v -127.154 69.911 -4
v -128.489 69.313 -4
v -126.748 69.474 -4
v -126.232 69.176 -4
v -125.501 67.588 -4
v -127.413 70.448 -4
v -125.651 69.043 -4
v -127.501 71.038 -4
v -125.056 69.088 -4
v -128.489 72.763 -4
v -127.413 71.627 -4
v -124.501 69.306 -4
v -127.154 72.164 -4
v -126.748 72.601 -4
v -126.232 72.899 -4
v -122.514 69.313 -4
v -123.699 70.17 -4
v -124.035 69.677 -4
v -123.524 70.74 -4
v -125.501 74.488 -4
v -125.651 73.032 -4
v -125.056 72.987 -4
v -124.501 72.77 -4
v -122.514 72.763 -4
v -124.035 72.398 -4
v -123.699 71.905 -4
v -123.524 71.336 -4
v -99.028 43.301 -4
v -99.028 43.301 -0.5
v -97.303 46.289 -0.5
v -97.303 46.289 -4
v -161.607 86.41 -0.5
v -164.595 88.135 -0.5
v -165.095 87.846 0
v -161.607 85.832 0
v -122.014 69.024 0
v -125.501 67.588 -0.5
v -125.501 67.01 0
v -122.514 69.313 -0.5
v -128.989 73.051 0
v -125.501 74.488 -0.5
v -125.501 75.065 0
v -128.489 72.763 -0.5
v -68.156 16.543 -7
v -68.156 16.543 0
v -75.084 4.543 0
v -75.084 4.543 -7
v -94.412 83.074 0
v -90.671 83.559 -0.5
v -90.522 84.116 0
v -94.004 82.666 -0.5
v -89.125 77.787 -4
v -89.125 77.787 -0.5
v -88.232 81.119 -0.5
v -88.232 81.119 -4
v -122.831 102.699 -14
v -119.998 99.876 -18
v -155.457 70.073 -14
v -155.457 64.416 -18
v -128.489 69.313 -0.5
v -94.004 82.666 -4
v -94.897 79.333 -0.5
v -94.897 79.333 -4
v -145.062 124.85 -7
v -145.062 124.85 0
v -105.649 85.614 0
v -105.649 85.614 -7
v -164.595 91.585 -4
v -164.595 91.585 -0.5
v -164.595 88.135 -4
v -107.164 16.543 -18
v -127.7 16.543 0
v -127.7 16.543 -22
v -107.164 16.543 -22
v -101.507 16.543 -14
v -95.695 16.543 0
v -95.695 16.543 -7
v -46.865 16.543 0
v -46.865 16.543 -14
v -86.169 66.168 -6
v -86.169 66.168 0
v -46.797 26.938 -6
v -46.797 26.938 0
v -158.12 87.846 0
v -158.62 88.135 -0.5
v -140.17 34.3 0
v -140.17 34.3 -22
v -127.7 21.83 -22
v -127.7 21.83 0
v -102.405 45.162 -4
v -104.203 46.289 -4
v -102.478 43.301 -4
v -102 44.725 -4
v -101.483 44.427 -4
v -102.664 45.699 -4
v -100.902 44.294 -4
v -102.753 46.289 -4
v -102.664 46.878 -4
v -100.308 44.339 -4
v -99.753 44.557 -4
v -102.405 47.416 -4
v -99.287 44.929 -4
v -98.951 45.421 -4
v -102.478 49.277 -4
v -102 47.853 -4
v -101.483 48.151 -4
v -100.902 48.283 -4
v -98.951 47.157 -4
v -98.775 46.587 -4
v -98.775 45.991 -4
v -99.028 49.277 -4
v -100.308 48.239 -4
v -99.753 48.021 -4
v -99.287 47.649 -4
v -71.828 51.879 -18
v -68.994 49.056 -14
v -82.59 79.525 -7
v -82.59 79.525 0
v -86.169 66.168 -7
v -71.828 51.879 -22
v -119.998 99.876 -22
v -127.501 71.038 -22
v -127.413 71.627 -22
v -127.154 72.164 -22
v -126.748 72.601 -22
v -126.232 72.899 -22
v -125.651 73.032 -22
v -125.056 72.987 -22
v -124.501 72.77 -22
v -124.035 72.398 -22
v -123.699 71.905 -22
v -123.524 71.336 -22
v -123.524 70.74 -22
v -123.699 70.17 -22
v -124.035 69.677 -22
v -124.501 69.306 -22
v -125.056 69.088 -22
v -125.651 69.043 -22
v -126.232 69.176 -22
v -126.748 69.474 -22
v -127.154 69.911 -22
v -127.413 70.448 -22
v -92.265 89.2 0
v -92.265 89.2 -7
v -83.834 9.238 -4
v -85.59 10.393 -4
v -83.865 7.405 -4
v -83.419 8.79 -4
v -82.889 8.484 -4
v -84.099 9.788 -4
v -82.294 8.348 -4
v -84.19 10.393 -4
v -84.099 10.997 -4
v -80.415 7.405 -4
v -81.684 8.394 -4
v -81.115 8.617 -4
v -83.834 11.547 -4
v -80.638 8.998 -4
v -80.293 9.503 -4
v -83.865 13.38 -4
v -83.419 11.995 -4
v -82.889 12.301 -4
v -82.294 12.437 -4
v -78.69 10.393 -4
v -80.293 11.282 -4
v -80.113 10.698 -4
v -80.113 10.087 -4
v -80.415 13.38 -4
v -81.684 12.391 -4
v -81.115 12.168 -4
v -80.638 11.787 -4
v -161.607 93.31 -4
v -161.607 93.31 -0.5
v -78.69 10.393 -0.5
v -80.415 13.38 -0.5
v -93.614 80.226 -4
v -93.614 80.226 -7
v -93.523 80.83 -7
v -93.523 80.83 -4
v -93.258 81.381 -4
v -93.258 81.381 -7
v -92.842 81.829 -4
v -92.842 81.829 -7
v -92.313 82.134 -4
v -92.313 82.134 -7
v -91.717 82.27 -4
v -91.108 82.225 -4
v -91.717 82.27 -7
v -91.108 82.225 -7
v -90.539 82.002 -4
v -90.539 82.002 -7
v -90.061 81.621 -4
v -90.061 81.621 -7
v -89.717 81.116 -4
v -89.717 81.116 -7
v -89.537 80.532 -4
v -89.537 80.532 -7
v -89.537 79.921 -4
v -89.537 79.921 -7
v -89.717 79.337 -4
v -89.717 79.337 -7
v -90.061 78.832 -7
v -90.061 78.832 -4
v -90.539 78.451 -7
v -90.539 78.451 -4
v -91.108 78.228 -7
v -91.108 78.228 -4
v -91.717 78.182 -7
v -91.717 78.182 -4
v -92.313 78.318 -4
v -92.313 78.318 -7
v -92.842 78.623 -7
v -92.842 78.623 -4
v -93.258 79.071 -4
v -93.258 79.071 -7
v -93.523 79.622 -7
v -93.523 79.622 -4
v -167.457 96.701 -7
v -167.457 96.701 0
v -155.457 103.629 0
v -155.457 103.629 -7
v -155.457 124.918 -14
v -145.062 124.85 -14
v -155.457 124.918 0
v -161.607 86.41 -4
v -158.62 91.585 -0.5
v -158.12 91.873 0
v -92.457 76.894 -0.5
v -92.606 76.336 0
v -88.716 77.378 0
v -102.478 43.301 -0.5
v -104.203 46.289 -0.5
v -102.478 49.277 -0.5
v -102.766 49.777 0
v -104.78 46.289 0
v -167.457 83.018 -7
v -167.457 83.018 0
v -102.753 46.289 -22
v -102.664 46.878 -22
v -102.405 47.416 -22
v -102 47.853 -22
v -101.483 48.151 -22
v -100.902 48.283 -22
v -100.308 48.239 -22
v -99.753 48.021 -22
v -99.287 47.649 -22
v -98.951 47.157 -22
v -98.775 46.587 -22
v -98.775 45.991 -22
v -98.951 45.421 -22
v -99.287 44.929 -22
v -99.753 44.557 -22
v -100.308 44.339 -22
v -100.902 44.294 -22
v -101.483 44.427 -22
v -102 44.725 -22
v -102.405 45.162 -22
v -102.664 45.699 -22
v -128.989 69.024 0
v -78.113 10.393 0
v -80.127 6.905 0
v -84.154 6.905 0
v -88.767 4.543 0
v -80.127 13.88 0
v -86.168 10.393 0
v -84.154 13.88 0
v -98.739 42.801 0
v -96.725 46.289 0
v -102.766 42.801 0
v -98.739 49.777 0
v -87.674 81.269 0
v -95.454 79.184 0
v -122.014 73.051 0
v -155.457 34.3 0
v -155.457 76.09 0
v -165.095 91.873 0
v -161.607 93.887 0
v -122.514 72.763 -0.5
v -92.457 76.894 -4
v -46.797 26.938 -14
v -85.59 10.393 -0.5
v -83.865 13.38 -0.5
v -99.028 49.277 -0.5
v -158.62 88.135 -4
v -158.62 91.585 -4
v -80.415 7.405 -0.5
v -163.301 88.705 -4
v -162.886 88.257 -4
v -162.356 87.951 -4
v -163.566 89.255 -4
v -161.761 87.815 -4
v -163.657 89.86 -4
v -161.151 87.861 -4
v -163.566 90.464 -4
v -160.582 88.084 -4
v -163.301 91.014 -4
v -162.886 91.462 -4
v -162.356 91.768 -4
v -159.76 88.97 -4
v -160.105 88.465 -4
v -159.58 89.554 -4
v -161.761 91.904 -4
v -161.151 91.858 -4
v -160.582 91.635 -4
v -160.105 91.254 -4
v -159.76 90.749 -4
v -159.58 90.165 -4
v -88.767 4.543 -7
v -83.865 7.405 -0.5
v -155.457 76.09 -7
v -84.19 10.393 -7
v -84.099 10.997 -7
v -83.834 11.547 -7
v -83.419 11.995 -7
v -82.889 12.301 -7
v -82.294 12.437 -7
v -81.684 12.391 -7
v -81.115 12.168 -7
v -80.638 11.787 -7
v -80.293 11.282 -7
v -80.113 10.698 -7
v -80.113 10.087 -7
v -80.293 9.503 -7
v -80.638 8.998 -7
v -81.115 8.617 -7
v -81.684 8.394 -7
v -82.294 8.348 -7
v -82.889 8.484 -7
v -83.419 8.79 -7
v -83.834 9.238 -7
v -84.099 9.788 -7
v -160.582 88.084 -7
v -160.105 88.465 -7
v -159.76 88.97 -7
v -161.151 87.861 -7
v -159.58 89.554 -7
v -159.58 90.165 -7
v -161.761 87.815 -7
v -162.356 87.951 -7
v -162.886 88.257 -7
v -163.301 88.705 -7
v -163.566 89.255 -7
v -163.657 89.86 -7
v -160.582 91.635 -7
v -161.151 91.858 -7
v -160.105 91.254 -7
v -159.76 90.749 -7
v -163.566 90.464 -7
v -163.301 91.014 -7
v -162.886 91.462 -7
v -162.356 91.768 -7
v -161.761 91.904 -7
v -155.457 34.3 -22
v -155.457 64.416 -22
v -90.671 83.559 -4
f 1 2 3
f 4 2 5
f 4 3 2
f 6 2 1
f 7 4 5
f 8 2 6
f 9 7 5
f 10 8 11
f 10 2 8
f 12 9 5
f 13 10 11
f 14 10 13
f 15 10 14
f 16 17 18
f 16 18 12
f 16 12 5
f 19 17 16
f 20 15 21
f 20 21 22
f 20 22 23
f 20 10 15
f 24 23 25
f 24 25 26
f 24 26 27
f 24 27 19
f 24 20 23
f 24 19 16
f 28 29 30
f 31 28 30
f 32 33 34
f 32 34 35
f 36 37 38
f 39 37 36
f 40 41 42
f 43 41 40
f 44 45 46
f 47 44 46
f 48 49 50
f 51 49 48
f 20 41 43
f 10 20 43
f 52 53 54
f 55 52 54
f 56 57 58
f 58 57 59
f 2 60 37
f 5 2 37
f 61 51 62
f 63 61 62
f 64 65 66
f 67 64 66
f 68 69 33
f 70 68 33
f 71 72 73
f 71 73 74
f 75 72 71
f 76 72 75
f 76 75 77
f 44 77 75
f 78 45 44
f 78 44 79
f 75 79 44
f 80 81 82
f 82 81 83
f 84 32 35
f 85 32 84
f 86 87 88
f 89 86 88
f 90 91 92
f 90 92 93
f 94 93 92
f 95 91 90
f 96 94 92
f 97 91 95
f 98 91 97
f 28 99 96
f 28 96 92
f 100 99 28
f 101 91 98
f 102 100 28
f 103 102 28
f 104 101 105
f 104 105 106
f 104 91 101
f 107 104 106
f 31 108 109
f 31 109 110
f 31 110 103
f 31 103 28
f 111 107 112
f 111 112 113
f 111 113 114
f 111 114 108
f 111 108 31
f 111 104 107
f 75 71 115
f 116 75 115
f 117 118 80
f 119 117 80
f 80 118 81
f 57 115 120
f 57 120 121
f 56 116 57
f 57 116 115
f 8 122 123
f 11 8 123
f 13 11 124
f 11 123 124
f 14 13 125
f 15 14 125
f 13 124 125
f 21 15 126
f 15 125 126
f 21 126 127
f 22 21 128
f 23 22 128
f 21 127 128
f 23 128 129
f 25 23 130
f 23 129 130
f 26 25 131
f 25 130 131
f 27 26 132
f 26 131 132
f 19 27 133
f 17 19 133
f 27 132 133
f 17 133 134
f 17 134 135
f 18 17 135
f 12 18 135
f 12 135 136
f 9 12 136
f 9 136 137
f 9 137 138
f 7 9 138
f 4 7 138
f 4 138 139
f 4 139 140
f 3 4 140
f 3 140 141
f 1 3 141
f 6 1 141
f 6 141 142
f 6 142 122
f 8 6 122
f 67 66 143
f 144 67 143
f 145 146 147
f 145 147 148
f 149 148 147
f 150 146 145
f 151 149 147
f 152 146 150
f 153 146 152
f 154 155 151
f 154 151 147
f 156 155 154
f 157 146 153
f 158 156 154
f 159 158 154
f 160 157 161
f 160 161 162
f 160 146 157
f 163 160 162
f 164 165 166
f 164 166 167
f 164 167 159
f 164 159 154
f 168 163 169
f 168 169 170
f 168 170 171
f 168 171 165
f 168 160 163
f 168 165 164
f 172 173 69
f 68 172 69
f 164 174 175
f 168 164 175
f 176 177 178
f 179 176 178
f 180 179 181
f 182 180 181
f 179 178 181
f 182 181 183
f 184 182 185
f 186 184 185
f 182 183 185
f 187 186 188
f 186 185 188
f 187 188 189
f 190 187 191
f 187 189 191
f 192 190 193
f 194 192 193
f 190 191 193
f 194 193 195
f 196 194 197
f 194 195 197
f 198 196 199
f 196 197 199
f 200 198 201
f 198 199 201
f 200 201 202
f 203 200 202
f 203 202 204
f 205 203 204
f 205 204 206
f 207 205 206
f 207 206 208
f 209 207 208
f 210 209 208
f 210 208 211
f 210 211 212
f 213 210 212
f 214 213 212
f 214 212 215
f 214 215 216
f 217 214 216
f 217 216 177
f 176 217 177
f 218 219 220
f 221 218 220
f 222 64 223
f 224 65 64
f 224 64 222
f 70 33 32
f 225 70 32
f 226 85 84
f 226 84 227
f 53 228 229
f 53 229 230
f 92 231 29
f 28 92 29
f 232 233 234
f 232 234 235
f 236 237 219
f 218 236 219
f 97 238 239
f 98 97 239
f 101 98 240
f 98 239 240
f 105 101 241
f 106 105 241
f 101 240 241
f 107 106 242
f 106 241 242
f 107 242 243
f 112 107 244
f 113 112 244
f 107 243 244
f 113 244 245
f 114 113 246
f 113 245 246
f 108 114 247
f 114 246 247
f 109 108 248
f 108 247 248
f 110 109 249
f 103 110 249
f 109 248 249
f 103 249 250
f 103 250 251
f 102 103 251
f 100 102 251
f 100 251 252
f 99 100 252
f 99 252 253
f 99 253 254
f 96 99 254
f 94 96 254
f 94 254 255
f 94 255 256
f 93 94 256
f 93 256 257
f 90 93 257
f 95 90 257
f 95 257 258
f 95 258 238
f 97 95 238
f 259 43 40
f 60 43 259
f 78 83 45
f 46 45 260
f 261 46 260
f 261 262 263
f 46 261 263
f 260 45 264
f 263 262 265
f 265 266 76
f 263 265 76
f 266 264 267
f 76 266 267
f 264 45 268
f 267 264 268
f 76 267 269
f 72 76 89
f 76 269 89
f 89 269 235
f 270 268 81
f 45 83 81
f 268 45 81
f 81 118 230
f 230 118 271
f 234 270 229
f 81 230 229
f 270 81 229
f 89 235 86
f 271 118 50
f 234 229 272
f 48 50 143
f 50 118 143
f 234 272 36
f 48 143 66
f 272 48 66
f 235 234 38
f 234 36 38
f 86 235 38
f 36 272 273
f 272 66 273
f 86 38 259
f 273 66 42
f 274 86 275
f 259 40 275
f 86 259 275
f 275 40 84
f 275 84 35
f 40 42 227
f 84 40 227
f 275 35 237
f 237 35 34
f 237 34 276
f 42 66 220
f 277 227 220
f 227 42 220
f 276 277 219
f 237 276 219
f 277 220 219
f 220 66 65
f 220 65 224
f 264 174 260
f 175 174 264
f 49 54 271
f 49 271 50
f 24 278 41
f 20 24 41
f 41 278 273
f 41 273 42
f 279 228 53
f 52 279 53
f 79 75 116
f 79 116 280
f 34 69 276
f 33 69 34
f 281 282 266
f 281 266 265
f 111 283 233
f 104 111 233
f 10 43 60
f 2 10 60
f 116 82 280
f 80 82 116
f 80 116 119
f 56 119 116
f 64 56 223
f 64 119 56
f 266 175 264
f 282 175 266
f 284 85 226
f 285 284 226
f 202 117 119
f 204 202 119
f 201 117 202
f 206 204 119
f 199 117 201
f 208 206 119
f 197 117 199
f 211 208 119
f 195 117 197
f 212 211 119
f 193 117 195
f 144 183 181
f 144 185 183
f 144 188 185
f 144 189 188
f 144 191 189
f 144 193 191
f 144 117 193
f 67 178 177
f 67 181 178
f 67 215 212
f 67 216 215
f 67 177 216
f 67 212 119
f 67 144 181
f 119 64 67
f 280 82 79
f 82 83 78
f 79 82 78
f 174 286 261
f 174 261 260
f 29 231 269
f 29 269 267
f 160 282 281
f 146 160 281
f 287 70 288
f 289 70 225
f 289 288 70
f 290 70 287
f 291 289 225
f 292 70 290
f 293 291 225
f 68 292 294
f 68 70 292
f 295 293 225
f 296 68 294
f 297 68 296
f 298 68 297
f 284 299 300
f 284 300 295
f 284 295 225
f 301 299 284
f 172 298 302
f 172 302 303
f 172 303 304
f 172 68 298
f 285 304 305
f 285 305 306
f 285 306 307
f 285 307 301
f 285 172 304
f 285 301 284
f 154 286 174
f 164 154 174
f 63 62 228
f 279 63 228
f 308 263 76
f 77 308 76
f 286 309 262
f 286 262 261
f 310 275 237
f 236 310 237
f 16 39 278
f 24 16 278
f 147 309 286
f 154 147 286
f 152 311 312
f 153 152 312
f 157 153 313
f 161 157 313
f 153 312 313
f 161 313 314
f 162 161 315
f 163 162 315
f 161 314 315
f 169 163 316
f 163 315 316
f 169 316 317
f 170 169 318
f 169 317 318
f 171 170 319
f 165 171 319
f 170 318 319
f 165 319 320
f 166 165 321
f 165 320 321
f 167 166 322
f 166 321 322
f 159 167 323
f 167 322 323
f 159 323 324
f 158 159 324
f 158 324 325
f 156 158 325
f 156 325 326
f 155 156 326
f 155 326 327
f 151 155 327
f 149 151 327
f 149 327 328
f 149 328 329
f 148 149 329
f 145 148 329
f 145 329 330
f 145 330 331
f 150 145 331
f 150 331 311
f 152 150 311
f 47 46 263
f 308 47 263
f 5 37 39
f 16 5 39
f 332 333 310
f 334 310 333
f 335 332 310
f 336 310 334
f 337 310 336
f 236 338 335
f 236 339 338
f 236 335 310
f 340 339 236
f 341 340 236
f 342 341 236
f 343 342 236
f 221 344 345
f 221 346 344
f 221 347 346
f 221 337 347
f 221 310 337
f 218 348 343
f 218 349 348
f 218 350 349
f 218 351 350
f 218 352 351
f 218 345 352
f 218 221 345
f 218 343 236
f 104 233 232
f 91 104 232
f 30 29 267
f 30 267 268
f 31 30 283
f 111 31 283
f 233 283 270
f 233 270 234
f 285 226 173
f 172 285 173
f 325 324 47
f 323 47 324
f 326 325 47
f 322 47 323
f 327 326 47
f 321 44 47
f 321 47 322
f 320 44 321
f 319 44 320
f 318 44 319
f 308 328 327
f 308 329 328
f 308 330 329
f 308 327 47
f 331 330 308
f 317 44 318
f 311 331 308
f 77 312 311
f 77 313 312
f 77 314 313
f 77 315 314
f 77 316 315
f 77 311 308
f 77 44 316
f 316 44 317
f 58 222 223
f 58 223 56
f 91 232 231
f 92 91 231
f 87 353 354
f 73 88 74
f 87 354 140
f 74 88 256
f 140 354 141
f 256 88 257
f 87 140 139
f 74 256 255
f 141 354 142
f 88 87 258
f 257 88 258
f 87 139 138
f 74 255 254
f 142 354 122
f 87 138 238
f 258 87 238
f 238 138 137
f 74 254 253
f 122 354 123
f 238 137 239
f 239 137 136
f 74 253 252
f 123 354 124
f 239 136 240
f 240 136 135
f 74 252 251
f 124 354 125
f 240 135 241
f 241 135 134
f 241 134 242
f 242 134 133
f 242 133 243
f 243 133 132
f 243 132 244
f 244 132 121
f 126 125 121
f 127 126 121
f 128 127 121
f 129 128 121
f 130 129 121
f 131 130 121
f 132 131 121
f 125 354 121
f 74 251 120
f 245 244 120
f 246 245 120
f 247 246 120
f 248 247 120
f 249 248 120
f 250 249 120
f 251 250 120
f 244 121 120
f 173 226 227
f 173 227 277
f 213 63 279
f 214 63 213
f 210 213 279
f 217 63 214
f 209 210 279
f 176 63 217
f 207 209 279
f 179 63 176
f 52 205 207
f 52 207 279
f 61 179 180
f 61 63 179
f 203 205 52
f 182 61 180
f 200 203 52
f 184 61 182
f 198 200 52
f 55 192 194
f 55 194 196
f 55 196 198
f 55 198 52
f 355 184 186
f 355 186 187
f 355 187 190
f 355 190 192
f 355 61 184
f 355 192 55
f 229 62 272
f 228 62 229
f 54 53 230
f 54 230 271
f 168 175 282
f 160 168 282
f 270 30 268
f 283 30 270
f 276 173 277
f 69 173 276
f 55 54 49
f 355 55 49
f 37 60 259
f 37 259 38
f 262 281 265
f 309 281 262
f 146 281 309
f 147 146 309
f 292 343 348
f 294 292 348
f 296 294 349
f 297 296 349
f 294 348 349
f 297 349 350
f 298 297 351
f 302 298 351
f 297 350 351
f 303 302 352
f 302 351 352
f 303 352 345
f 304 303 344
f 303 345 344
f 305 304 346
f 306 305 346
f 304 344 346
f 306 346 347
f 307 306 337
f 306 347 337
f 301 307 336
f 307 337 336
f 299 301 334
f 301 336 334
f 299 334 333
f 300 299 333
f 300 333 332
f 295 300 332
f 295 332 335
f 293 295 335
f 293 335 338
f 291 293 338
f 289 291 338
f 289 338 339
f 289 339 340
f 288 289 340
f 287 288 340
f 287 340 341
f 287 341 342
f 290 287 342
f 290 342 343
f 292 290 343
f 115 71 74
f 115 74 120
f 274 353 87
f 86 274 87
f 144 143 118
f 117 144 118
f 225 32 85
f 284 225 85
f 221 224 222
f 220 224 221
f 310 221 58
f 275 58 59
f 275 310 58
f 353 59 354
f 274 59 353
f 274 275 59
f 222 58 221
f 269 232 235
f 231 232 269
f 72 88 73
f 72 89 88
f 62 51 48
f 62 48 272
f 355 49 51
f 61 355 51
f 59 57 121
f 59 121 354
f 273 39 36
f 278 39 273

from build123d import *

# Parameters (mm, degrees)
BOSS_EXTRUDE1_DEPTH      = 7
SKETCH2_R                = 2.05
CUT_EXTRUDE1_DEPTH       = 210.034905978
CUT_EXTRUDE2_DEPTH       = 4
BOSS_EXTRUDE8_DEPTH      = 7
BOSS_EXTRUDE8_DEPTH_BACK = 1
BOSS_EXTRUDE9_DEPTH      = 8
SKETCH22_R               = 2
CUT_EXTRUDE3_DEPTH       = 211.072825271
CUT_EXTRUDE4_DEPTH       = 4
CHAMFER1_SIZE            = 0.5
CHAMFER2_SIZE            = 0.5
CHAMFER3_SIZE            = 4


with BuildPart() as part:
    # Sketch1 → Boss-Extrude1 (new body)
    with BuildSketch(Plane.XY):
        Polygon((-86.168640192, 66.168375393), (-46.796854981, 26.9381166), (-46.864915159, 16.542640687), (-68.155605804, 16.542640687), (-75.083809034, 4.542640687), (-88.767010414, 4.542640687), (-95.695213644, 16.542640687), (-127.7, 16.542640687), (-127.7, 21.829570993), (-140.170429007, 34.3), (-155.457359313, 34.3), (-155.457359313, 76.089816153), (-167.457359313, 83.018019384), (-167.457359313, 96.701220763), (-155.457359313, 103.629423994), (-155.457359313, 124.918472329), (-145.062341245, 124.850415149), (-105.649268389, 85.614252867), (-92.265224659, 89.200496576), (-82.589740175, 79.525012092), align=None)
    extrude(amount=-BOSS_EXTRUDE1_DEPTH)

    # Sketch2 → Cut-Extrude1 (cut, through all)
    with BuildSketch(Plane(origin=(0, 0, -7), x_dir=(-1, 0, 0), z_dir=(0, 0, -1))):
        with Locations((82.1403802, 10.392640687)):
            Circle(SKETCH2_R)
        with Locations((91.564057064, 80.226179394)):
            Circle(SKETCH2_R)
        with Locations((161.607359313, 89.8596198)):
            Circle(SKETCH2_R)
    extrude(amount=-CUT_EXTRUDE1_DEPTH, mode=Mode.SUBTRACT)

    # Sketch3 → Cut-Extrude2 (cut)
    with BuildSketch(Plane.XY):
        Polygon((-158.61957167, 88.1346198), (-158.61957167, 91.5846198), (-161.607359313, 93.3096198), (-164.595146956, 91.5846198), (-164.595146956, 88.1346198), (-161.607359313, 86.4096198), align=None)
        Polygon((-88.231612963, 81.1191051), (-90.671131358, 83.558623495), (-94.003575459, 82.665697789), (-94.896501165, 79.333253689), (-92.456982769, 76.893735294), (-89.124538669, 77.786660999), align=None)
        Polygon((-80.4153802, 7.404853044), (-78.6903802, 10.392640687), (-80.4153802, 13.38042833), (-83.8653802, 13.38042833), (-85.5903802, 10.392640687), (-83.8653802, 7.404853044), align=None)
    extrude(amount=-CUT_EXTRUDE2_DEPTH, mode=Mode.SUBTRACT)

    # Sketch19 → Boss-Extrude8 (add, two sides: drawn at the far end of the back side and taken through both)
    with BuildSketch(Plane(origin=(0, 0, -7), x_dir=(-1, 0, 0), z_dir=(0, 0, -1)).offset(-BOSS_EXTRUDE8_DEPTH_BACK)):
        Polygon((46.864915159, 16.542640687), (46.796854981, 26.9381166), (145.062341245, 124.850415149), (155.457359313, 124.918472329), (155.457359313, 34.3), (140.170429007, 34.3), (127.7, 21.829570993), (127.7, 16.542640687), align=None)
    extrude(amount=BOSS_EXTRUDE8_DEPTH + BOSS_EXTRUDE8_DEPTH_BACK)

    # Sketch20 → Boss-Extrude9 (add)
    with BuildSketch(Plane(origin=(0, 0, -14), x_dir=(-1, 0, 0), z_dir=(0, 0, -1))):
        Polygon((127.7, 16.542640687), (107.164334943, 16.542640687), (71.827840432, 51.879135198), (119.997668017, 99.875829855), (155.457359313, 64.416138559), (155.457359313, 34.3), (140.170429007, 34.3), (127.7, 21.829570993), align=None)
    extrude(amount=BOSS_EXTRUDE9_DEPTH)

    # Sketch22 → Cut-Extrude3 (cut, through all)
    with BuildSketch(Plane(origin=(0, 0, -22), x_dir=(-1, 0, 0), z_dir=(0, 0, -1))):
        with Locations((100.752632712, 46.288866697)):
            Circle(SKETCH22_R)
        with Locations((125.501370054, 71.037604039)):
            Circle(SKETCH22_R)
    extrude(amount=-CUT_EXTRUDE3_DEPTH, mode=Mode.SUBTRACT)

    # Sketch23 → Cut-Extrude4 (cut)
    with BuildSketch(Plane.XY):
        Polygon((-125.501370054, 74.487604039), (-128.489157697, 72.762604039), (-128.489157697, 69.312604039), (-125.501370054, 67.587604039), (-122.513582411, 69.312604039), (-122.513582411, 72.762604039), align=None)
        Polygon((-104.202632712, 46.288866697), (-102.477632712, 43.301079054), (-99.027632712, 43.301079054), (-97.302632712, 46.288866697), (-99.027632712, 49.27665434), (-102.477632712, 49.27665434), align=None)
    extrude(amount=-CUT_EXTRUDE4_DEPTH, mode=Mode.SUBTRACT)

    # Chamfer1
    chamfer1_edges = [part.edges().sort_by_distance(p)[0] for p in [
        (-160.113465491, 87.2721198, 0),
        (-158.61957167, 89.8596198, 0),
        (-160.113465491, 92.4471198, 0),
        (-163.101253134, 92.4471198, 0),
        (-164.595146956, 89.8596198, 0),
        (-163.101253134, 87.2721198, 0),
        (-88.678075816, 79.45288305, 0),
        (-89.451372161, 82.338864297, 0),
        (-92.337353409, 83.112160642, 0),
        (-94.450038312, 80.999475739, 0),
        (-93.676741967, 78.113494491, 0),
        (-90.790760719, 77.340198146, 0),
        (-82.1403802, 7.404853044, 0),
        (-79.5528802, 8.898746866, 0),
        (-79.5528802, 11.886534509, 0),
        (-82.1403802, 13.38042833, 0),
        (-84.7278802, 11.886534509, 0),
        (-84.7278802, 8.898746866, 0),
    ]]
    chamfer(chamfer1_edges, length=CHAMFER1_SIZE)

    # Chamfer2
    chamfer2_edges = [part.edges().sort_by_distance(p)[0] for p in [
        (-124.007476232, 73.625104039, 0),
        (-126.995263875, 73.625104039, 0),
        (-128.489157697, 71.037604039, 0),
        (-126.995263875, 68.450104039, 0),
        (-124.007476232, 68.450104039, 0),
        (-122.513582411, 71.037604039, 0),
        (-103.340132712, 47.782760519, 0),
        (-103.340132712, 44.794972876, 0),
        (-100.752632712, 43.301079054, 0),
        (-98.165132712, 44.794972876, 0),
        (-98.165132712, 47.782760519, 0),
        (-100.752632712, 49.27665434, 0),
    ]]
    chamfer(chamfer2_edges, length=CHAMFER2_SIZE)

    # Chamfer3
    chamfer3_edges = [part.edges().sort_by_distance(p)[0] for p in [
        (-137.727513665, 82.145984207, -14),
        (-89.496087688, 34.210887943, -14),
    ]]
    chamfer(chamfer3_edges, length=CHAMFER3_SIZE)


solid = part.part
